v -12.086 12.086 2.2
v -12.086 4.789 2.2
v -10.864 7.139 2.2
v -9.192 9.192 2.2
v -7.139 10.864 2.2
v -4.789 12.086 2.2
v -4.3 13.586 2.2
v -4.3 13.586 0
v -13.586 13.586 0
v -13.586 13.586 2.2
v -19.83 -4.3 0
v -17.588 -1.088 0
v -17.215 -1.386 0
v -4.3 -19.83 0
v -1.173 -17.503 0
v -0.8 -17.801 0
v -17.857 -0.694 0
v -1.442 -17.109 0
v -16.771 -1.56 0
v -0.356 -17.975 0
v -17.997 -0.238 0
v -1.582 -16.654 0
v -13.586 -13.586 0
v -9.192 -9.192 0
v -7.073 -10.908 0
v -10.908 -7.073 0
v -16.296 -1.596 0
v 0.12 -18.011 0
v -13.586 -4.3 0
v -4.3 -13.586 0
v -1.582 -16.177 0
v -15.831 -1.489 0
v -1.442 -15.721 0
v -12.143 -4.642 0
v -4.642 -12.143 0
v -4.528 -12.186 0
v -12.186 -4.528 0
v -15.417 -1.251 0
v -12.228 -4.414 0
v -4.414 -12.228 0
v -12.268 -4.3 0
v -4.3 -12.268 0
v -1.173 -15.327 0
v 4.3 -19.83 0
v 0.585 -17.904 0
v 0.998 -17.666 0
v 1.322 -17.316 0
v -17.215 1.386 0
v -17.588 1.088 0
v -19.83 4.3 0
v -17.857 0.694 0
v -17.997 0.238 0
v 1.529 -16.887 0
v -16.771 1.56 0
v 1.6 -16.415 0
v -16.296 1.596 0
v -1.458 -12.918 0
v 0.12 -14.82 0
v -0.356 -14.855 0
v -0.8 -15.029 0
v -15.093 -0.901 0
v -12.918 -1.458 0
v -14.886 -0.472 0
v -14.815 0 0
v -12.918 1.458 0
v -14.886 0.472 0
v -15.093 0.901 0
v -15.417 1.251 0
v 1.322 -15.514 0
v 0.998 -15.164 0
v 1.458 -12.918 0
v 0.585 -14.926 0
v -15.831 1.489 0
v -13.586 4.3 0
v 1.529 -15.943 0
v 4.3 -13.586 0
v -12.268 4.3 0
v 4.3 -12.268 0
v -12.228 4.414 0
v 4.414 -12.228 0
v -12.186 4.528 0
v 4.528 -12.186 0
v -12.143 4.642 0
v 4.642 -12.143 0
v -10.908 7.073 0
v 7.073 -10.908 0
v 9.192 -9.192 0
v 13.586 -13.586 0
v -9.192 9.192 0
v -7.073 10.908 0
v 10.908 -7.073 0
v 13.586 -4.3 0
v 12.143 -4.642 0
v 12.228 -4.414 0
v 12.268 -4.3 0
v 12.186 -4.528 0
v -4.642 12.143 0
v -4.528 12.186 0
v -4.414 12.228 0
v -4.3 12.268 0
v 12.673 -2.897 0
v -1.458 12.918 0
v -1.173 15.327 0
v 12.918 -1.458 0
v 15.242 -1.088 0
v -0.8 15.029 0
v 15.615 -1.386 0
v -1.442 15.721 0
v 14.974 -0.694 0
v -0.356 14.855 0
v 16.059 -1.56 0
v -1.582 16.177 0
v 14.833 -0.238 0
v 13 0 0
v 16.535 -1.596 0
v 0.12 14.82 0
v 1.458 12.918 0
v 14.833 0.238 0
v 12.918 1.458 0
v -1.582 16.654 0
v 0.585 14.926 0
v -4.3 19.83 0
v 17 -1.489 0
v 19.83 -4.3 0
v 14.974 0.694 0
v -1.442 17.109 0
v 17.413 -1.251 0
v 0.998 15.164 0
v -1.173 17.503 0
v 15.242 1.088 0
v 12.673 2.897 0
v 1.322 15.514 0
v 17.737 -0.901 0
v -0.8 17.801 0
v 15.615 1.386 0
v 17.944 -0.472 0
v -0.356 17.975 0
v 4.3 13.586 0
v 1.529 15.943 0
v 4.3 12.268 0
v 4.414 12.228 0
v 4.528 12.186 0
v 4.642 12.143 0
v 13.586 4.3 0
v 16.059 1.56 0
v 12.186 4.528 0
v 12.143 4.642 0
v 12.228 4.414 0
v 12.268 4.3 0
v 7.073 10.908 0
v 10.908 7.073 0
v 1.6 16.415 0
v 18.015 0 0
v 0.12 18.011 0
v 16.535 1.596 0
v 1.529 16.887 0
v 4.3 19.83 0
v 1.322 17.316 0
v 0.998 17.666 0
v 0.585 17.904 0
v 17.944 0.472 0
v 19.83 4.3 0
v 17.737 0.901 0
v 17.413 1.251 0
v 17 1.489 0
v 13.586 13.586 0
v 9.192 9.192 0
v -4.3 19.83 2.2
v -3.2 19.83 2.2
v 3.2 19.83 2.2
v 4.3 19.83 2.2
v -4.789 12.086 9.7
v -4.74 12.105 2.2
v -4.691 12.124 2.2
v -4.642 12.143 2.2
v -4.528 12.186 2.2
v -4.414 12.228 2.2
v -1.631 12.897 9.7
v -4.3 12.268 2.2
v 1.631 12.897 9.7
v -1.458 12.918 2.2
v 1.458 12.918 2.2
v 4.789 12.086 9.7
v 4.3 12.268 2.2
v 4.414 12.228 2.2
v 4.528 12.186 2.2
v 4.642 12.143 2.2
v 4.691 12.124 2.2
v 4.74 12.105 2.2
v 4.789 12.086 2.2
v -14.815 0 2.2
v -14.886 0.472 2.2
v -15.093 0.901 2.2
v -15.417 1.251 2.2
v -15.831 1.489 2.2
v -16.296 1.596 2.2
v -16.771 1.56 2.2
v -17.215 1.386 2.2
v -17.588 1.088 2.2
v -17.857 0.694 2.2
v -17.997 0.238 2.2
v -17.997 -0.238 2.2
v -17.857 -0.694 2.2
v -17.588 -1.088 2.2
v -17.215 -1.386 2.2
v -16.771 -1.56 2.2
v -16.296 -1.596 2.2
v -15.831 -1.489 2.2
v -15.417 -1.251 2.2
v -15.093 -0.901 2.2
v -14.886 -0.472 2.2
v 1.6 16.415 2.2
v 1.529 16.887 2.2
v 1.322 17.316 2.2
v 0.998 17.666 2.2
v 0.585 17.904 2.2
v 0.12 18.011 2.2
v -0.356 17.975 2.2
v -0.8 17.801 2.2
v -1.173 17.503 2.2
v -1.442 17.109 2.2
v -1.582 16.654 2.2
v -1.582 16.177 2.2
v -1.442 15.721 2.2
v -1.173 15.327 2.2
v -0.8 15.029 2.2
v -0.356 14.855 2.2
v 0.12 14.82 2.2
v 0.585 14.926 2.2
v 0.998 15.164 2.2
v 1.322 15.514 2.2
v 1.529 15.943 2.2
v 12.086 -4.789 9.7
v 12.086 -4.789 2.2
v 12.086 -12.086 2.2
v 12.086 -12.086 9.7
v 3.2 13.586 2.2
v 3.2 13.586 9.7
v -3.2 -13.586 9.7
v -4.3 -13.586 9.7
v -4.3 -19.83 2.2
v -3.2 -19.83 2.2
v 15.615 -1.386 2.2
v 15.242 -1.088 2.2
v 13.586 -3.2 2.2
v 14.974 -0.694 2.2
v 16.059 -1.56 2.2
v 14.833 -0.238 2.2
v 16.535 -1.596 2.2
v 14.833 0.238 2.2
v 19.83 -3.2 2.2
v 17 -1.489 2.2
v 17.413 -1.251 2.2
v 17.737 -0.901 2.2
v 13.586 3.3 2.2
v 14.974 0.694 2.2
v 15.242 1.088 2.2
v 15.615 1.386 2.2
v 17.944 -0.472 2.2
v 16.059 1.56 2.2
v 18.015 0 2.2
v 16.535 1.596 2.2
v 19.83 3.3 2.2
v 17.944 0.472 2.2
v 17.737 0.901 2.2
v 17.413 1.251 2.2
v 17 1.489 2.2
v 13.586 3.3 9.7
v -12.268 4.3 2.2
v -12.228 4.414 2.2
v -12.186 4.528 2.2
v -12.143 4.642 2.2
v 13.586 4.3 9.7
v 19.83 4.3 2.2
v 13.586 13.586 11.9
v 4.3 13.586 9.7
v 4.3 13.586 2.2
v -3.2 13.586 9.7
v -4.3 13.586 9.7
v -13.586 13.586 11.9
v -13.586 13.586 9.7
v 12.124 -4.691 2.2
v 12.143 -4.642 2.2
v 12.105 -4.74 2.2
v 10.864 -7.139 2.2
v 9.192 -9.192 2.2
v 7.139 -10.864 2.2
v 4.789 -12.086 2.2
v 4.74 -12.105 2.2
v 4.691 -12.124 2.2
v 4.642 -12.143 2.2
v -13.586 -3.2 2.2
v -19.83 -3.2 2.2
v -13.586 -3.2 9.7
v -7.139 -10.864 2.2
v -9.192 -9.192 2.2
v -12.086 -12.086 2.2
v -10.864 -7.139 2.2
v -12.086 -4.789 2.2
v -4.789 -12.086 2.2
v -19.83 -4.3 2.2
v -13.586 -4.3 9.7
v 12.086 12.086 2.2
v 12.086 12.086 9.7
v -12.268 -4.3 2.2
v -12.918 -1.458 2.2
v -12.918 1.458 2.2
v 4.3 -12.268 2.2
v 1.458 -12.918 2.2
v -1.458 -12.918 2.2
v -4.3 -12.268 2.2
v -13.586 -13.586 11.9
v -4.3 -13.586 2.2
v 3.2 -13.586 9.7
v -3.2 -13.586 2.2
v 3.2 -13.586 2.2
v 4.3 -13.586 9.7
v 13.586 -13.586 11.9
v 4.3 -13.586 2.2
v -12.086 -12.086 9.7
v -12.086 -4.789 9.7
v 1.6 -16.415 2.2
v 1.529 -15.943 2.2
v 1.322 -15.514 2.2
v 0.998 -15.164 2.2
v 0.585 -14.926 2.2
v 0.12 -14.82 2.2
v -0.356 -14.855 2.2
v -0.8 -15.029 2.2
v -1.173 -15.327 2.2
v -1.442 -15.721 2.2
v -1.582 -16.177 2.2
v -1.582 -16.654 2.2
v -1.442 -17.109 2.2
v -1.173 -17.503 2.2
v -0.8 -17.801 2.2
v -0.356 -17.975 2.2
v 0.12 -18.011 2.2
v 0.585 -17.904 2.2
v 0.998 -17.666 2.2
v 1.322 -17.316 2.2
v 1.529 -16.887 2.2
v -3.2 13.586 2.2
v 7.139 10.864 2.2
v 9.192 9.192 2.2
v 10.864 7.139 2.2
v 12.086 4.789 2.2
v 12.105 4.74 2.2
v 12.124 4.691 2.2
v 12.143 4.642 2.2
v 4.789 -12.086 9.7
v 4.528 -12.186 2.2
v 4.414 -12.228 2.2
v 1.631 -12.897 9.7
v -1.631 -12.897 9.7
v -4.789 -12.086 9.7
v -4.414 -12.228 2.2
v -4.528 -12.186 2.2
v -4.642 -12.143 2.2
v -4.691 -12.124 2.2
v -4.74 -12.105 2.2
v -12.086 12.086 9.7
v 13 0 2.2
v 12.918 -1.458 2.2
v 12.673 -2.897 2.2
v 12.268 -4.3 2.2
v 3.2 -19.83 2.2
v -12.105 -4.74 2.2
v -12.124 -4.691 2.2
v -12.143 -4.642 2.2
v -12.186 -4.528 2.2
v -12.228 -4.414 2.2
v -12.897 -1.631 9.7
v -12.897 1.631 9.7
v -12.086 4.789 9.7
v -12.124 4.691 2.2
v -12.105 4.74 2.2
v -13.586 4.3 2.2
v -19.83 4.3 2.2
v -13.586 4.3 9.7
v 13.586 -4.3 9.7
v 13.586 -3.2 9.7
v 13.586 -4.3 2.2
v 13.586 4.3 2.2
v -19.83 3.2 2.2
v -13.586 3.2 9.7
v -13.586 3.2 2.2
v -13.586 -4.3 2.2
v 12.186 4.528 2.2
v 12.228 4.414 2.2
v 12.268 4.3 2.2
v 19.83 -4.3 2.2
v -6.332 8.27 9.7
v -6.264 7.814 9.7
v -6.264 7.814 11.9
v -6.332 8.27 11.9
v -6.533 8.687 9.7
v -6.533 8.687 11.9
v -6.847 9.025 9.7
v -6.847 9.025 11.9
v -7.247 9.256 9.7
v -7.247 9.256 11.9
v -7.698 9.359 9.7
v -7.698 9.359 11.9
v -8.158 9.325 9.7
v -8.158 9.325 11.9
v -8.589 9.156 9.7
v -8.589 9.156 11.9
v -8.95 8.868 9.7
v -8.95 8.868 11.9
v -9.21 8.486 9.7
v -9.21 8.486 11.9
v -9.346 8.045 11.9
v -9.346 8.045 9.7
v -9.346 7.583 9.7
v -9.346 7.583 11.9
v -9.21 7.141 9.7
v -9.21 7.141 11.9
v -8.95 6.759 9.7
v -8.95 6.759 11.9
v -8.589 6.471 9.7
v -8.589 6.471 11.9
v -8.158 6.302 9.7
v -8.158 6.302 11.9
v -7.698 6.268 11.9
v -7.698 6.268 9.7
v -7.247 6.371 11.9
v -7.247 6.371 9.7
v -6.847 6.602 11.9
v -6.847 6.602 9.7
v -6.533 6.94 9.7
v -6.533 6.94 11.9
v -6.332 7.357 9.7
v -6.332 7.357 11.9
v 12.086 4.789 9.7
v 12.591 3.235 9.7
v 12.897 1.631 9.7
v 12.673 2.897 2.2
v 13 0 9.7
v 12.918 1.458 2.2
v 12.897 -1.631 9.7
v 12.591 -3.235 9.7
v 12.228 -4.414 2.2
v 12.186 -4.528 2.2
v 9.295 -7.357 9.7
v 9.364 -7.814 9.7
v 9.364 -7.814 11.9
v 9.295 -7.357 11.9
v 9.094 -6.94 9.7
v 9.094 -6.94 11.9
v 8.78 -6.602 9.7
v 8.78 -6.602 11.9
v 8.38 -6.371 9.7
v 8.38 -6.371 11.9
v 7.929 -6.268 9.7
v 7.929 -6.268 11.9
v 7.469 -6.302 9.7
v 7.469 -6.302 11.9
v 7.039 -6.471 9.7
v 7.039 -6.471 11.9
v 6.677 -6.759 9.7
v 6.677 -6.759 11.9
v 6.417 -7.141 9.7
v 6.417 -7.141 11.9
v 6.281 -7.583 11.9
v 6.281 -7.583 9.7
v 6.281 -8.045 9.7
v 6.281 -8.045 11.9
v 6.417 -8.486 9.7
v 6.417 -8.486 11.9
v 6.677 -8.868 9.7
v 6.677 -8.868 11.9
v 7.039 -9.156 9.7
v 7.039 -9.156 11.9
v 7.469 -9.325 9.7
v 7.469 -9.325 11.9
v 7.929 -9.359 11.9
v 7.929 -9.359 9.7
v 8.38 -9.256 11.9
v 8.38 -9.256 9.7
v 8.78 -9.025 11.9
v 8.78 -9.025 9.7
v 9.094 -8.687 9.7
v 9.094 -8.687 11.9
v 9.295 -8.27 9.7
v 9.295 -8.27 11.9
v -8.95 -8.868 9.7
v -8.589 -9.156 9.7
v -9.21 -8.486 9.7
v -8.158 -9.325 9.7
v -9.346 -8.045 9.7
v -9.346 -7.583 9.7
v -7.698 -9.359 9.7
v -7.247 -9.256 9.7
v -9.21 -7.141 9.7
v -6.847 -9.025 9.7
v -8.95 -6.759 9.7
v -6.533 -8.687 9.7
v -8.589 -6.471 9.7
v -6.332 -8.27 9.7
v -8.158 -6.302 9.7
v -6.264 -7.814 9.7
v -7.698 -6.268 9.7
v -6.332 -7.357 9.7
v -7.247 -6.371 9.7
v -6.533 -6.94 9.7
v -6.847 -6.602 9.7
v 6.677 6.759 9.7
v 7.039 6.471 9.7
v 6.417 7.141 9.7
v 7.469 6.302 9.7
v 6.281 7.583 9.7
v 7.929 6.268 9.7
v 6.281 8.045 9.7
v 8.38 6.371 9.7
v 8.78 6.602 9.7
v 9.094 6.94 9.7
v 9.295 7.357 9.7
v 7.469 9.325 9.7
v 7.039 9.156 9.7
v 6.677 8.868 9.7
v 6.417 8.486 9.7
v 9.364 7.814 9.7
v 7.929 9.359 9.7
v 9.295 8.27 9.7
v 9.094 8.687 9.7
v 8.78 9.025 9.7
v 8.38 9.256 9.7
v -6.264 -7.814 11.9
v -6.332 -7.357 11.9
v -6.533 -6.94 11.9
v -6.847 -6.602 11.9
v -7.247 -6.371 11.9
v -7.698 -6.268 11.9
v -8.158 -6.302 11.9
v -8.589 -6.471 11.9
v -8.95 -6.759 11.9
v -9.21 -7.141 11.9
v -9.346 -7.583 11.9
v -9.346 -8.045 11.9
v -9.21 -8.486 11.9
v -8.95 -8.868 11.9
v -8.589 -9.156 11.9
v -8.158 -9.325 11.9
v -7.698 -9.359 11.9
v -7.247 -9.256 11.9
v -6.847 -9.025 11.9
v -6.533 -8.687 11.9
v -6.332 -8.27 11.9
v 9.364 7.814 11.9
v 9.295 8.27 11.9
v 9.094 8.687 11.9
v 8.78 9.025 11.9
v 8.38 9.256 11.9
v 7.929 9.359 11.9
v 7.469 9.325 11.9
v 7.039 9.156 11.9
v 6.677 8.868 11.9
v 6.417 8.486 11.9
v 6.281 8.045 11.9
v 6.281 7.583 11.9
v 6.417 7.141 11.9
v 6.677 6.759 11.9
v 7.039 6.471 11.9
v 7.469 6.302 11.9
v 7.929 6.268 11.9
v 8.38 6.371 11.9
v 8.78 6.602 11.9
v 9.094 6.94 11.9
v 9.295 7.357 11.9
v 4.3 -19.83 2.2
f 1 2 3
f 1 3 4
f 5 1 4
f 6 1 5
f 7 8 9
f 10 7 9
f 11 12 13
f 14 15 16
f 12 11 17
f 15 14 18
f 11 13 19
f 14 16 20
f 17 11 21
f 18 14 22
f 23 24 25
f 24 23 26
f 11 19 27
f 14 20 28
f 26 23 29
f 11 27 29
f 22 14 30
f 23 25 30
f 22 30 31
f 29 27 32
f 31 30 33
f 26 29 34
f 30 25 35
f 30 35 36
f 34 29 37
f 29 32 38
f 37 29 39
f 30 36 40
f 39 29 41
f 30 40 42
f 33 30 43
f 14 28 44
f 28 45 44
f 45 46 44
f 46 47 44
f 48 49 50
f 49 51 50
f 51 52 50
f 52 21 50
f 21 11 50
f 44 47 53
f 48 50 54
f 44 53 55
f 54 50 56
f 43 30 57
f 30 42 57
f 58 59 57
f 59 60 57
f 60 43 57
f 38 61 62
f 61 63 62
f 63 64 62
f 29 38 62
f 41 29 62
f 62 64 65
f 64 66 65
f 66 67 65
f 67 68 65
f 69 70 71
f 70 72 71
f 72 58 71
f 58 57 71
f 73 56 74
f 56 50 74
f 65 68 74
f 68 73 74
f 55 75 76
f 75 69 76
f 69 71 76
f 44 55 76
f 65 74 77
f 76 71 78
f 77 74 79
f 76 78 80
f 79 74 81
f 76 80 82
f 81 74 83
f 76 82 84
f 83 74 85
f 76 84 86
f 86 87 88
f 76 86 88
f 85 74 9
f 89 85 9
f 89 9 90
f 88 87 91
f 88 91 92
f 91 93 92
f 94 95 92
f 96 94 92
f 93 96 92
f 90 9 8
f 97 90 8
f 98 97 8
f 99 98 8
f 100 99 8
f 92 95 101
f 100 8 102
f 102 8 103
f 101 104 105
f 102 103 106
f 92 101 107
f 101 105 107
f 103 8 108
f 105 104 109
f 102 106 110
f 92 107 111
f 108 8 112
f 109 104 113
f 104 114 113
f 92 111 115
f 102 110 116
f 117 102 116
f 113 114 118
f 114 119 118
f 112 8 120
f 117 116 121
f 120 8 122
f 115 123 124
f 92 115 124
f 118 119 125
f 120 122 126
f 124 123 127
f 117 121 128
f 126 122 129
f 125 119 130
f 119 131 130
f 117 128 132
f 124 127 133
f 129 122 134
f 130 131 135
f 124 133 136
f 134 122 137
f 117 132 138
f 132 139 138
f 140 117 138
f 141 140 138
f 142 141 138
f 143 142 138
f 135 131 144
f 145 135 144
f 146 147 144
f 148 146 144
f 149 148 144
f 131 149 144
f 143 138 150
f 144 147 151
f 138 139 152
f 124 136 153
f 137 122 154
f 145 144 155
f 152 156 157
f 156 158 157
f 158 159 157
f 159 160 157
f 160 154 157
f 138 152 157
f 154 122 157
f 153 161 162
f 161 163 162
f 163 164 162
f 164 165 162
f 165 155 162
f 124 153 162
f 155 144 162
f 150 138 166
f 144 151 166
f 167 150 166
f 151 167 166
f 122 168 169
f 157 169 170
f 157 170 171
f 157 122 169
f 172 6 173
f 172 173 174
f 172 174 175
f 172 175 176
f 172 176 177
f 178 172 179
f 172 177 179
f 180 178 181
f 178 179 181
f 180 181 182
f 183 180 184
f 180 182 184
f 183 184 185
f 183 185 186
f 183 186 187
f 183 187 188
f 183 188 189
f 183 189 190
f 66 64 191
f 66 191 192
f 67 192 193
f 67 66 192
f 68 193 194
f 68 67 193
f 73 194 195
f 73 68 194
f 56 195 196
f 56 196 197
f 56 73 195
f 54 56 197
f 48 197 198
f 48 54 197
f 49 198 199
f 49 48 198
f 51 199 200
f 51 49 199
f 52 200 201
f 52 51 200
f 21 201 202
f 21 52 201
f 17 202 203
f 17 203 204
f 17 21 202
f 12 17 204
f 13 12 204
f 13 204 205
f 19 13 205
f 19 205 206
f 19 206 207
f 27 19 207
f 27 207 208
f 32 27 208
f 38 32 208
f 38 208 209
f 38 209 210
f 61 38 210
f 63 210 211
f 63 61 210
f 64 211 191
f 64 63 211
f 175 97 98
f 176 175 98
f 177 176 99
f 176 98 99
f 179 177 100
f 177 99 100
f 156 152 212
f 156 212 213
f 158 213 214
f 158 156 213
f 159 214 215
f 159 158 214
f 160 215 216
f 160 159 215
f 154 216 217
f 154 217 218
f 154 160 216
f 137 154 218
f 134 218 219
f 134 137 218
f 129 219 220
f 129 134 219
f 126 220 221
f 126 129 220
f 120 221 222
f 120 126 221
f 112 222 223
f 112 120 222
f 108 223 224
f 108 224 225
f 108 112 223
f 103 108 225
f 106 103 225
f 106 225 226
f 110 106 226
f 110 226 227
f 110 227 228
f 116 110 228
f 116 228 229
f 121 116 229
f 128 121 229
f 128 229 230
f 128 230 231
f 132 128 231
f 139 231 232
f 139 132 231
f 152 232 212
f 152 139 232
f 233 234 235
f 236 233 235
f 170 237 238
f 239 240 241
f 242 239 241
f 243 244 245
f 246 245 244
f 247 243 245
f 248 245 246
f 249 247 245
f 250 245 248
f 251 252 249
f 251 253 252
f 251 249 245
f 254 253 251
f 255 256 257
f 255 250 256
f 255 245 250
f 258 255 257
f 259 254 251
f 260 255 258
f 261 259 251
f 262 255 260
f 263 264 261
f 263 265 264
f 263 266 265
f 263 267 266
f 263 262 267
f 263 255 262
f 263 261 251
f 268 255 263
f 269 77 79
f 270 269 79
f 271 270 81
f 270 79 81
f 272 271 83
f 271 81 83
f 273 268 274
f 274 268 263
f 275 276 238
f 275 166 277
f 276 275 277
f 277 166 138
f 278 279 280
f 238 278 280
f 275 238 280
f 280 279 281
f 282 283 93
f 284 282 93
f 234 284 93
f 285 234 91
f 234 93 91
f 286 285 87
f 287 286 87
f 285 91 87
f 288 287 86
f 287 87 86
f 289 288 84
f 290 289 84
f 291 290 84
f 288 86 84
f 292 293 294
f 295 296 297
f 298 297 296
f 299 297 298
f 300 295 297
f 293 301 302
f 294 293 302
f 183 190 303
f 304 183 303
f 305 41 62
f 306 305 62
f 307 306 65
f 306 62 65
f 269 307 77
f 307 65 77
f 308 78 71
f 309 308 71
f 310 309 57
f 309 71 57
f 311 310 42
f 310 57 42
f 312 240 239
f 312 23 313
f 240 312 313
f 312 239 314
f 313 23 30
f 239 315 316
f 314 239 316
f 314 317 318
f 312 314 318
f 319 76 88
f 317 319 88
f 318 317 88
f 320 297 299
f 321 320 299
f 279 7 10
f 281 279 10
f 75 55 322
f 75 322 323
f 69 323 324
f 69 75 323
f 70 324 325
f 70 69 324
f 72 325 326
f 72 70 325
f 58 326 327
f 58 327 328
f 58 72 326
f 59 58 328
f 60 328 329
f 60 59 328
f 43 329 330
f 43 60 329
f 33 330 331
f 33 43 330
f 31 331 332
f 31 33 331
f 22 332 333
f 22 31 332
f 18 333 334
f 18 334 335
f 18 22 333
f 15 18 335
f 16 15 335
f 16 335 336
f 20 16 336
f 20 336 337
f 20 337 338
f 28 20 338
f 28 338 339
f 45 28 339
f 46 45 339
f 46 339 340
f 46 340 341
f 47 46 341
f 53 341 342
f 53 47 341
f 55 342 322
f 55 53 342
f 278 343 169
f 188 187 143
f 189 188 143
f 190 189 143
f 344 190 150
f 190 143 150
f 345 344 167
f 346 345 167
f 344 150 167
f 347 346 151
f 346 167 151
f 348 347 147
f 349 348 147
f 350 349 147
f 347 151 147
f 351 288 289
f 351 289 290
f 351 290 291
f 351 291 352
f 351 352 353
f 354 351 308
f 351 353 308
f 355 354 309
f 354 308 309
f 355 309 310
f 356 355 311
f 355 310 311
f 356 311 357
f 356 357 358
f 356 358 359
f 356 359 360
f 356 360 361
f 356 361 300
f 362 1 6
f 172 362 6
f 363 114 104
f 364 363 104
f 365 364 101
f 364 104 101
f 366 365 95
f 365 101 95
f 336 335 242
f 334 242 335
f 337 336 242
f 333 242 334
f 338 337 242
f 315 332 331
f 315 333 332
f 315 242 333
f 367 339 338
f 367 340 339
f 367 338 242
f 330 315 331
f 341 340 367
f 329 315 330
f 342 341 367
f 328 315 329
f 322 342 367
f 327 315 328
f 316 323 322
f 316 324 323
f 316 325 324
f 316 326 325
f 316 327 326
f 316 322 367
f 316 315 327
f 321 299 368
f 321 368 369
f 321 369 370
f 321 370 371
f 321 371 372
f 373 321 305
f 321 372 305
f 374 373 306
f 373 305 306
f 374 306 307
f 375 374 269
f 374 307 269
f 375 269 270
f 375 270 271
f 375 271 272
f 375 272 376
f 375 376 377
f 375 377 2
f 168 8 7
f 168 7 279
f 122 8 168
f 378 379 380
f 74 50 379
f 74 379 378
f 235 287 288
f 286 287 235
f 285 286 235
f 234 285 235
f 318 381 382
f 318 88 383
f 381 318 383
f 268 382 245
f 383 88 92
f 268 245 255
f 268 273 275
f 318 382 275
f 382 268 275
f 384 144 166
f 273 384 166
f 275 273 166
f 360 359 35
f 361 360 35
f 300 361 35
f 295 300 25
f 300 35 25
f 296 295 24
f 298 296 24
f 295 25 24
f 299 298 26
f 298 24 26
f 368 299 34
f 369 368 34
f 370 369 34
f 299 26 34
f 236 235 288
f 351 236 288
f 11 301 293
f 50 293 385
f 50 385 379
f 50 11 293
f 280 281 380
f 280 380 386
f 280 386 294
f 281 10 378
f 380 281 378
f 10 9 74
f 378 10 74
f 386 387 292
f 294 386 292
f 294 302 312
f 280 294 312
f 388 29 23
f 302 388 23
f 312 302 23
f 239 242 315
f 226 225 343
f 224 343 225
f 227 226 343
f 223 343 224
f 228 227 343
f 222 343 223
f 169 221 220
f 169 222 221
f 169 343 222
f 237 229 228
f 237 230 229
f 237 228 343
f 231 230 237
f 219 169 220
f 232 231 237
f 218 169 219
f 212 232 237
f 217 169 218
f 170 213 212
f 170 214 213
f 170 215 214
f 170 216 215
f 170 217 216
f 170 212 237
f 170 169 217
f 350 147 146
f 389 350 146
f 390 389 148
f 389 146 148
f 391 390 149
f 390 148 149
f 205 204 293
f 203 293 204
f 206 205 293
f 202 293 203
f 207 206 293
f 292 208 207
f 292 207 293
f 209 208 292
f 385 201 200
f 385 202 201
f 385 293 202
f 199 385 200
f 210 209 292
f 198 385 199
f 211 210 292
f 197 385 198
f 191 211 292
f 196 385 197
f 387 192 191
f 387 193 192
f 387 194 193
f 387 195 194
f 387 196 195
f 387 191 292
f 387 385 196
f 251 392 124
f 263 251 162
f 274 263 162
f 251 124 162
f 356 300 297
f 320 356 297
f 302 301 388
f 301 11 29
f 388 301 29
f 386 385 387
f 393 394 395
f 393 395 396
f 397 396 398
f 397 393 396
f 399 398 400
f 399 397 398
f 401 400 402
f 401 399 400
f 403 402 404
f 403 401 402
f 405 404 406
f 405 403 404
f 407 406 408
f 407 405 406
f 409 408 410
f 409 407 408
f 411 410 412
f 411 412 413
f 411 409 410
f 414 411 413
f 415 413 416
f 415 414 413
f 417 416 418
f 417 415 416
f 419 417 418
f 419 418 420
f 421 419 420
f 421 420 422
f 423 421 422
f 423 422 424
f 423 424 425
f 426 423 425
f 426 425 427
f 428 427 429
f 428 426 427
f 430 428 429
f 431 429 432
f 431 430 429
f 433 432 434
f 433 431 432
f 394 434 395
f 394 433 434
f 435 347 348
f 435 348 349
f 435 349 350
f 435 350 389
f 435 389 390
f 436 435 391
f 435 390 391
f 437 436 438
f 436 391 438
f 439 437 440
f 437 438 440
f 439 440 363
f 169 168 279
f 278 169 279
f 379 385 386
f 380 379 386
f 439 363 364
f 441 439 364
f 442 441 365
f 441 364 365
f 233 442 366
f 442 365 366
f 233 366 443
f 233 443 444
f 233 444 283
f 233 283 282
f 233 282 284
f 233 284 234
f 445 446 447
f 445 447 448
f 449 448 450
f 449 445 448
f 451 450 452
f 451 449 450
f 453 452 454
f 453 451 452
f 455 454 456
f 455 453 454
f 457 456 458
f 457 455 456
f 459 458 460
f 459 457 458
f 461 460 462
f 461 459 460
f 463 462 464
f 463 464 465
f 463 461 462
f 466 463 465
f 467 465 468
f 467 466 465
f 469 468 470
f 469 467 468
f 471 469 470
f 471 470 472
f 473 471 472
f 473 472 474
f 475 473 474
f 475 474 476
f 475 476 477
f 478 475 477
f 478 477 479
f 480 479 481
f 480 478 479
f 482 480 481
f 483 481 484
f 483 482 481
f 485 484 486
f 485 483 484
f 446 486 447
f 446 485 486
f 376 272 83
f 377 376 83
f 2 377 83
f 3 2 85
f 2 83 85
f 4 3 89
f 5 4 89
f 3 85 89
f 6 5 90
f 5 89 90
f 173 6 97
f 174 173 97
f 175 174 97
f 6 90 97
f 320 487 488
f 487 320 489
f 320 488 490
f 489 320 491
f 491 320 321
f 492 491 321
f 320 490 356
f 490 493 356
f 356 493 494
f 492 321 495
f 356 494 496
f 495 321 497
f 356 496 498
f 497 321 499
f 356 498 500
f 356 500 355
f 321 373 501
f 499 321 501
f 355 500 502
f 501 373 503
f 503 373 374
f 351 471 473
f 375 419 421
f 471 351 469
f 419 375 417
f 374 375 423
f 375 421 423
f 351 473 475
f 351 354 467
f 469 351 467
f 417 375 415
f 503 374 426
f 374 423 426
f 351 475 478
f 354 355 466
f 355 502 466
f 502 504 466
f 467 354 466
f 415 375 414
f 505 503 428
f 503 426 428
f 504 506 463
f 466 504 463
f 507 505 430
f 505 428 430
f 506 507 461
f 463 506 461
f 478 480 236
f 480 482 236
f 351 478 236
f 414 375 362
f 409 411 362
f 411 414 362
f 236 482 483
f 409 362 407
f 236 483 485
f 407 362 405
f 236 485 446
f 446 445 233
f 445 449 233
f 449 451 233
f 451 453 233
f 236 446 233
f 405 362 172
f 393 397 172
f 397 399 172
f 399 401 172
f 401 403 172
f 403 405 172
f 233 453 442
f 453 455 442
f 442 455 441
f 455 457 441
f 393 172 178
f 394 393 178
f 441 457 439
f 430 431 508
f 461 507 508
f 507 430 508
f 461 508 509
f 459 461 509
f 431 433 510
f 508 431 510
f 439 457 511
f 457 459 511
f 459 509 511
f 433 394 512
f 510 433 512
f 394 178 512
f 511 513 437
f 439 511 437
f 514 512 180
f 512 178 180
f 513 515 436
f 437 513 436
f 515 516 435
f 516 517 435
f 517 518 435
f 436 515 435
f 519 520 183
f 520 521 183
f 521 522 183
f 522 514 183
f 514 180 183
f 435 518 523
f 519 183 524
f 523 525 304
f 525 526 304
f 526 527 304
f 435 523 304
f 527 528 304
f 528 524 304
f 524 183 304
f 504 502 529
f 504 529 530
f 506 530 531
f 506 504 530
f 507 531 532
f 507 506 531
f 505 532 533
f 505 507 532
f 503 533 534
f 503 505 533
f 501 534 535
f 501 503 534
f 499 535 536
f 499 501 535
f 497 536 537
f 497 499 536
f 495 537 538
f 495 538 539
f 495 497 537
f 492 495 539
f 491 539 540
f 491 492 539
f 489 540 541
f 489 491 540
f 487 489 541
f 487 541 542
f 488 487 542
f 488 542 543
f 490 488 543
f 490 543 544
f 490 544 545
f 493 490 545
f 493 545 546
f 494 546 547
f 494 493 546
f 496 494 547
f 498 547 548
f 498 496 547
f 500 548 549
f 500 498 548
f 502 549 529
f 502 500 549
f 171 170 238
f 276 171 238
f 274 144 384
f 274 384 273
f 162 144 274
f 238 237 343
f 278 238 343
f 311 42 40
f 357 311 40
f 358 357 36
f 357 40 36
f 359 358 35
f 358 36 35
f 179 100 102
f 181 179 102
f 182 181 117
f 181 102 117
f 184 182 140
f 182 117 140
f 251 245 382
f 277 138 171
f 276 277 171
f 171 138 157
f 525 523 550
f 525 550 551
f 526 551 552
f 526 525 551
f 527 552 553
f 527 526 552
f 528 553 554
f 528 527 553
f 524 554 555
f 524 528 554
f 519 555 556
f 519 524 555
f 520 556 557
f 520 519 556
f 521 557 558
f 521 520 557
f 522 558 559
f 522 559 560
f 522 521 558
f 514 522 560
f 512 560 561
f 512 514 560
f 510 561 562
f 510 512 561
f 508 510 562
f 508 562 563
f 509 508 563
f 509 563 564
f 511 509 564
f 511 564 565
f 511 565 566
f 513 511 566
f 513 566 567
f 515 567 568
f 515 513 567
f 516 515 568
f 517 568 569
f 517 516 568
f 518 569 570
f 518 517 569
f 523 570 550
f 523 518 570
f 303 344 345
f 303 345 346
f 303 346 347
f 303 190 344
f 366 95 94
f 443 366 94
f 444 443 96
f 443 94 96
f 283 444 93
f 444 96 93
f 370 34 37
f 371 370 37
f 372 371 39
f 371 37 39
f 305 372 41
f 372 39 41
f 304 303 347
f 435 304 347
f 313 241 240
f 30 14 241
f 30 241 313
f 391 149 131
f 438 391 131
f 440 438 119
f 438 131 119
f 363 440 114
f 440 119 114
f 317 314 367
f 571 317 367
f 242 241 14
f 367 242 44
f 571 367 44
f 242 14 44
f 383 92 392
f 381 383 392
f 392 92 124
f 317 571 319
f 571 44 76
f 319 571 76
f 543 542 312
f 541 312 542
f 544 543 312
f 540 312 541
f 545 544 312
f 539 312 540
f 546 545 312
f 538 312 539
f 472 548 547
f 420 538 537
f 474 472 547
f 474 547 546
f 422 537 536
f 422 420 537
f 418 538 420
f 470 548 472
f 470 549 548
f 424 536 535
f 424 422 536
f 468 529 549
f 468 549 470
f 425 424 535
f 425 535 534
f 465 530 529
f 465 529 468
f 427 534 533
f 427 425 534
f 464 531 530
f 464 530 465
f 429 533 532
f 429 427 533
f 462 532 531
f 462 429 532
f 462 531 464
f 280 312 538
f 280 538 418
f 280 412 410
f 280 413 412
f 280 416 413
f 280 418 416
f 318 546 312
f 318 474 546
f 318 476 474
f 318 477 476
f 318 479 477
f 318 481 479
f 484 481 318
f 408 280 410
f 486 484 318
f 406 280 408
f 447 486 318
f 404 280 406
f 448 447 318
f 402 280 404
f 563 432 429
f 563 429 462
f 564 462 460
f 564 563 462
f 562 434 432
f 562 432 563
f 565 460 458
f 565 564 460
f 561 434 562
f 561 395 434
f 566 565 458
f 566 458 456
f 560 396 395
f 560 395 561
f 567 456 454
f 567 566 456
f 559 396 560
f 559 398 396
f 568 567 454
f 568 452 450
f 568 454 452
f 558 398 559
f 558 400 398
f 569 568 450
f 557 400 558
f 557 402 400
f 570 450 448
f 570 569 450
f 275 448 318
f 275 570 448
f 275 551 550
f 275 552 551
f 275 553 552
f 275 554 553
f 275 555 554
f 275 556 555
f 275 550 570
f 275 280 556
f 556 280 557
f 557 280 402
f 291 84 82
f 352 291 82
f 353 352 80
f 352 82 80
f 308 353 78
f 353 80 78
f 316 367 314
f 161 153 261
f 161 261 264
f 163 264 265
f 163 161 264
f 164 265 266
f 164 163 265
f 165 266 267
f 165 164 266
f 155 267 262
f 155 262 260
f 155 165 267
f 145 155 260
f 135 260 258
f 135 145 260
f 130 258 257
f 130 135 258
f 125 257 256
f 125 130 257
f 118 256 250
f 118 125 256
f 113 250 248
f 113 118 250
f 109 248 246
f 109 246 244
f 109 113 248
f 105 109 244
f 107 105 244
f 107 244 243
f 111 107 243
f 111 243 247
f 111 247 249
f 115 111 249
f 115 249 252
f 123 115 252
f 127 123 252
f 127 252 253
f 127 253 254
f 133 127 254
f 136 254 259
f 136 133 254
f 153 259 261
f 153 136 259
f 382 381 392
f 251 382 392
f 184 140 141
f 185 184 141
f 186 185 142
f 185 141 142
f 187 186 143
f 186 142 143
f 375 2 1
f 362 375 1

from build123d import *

# Parameters (mm, degrees)
F0_R      = 1.6
F1_DEPTH  = 2.2
F2_W      = 1.1
F2_H      = 6.2444173613
F2_W_2    = 6.2444173613
F2_H_2    = 1
F2_H_3    = 1.1
F3_DEPTH  = 7.5
F5_DEPTH  = 24.1311635683
F7_DEPTH  = 24.1311635683
F9_DEPTH  = 24.1311635683
F11_DEPTH = 24.1311635683
F12_R     = 1.55
F13_DEPTH = 2.2


with BuildPart() as f1:
    # F0 (on Top) → F1 (new body)
    with BuildSketch(Plane.XY):
        with BuildLine():
            ThreePointArc((-4.3, 13.585746207), (0, 14.25), (4.3, 13.585746207))
            Line((4.3, 13.585746207), (4.3, 19.8301635683))
            Line((4.3, 19.8301635683), (0, 19.8301635683))
            Line((0, 19.8301635683), (-4.3, 19.8301635683))
            Line((-4.3, 19.8301635683), (-4.3, 13.585746207))
        make_face()
        with Locations((0, 16.4150817841)):
            Circle(F0_R, mode=Mode.SUBTRACT)
        with BuildLine():
            Line((-7.4573291436, 12.1429297142), (-4.642117831, 12.1429297142))
            ThreePointArc((-4.642117831, 12.1429297142), (-4.4714979846, 12.2067893311), (-4.3, 12.2682517092))
            Line((-4.3, 12.2682517092), (-4.3, 13.585746207))
            ThreePointArc((-4.3, 13.585746207), (-5.9227634602, 12.9608399803), (-7.4573291436, 12.1429297142))
        make_face()
        with BuildLine():
            ThreePointArc((-4.3, 12.2682517092), (0, 13), (4.3, 12.2682517092))
            Line((4.3, 12.2682517092), (4.3, 13.585746207))
            ThreePointArc((4.3, 13.585746207), (0, 14.25), (-4.3, 13.585746207))
            Line((-4.3, 13.585746207), (-4.3, 12.2682517092))
        make_face()
        with BuildLine():
            ThreePointArc((4.3, 12.2682517092), (4.4714979846, 12.2067893311), (4.642117831, 12.1429297142))
            Line((4.642117831, 12.1429297142), (7.4573291436, 12.1429297142))
            ThreePointArc((7.4573291436, 12.1429297142), (5.9227634602, 12.9608399803), (4.3, 13.585746207))
            Line((4.3, 13.585746207), (4.3, 12.2682517092))
        make_face()
        with BuildLine():
            ThreePointArc((12.2682517092, 4.3), (12.8157573366, 2.1809089596), (13, 0))
            ThreePointArc((13, 0), (12.8157573366, -2.1809089596), (12.2682517092, -4.3))
            Line((12.2682517092, -4.3), (13.585746207, -4.3))
            ThreePointArc((13.585746207, -4.3), (14.0829574921, -2.1755018445), (14.25, 0))
            ThreePointArc((14.25, 0), (14.0829574921, 2.1755018445), (13.585746207, 4.3))
            Line((13.585746207, 4.3), (12.2682517092, 4.3))
        make_face()
        with BuildLine():
            Line((19.8301635683, 4.3), (13.585746207, 4.3))
            ThreePointArc((13.585746207, 4.3), (14.0829574921, 2.1755018445), (14.25, 0))
            ThreePointArc((14.25, 0), (14.0829574921, -2.1755018445), (13.585746207, -4.3))
            Line((13.585746207, -4.3), (19.8301635683, -4.3))
            Line((19.8301635683, -4.3), (19.8301635683, 0))
            Line((19.8301635683, 0), (19.8301635683, 4.3))
        make_face()
        with Locations((16.4150817841, 0)):
            Circle(F0_R, mode=Mode.SUBTRACT)
        with BuildLine():
            Line((13.585746207, -4.3), (12.2682517092, -4.3))
            ThreePointArc((12.2682517092, -4.3), (12.2067893311, -4.4714979846), (12.1429297142, -4.642117831))
            Line((12.1429297142, -4.642117831), (12.1429297142, -7.4573291436))
            ThreePointArc((12.1429297142, -7.4573291436), (12.9608399803, -5.9227634602), (13.585746207, -4.3))
        make_face()
        with BuildLine():
            Line((4.3, -13.585746207), (4.3, -12.2682517092))
            ThreePointArc((4.3, -12.2682517092), (0, -13), (-4.3, -12.2682517092))
            Line((-4.3, -12.2682517092), (-4.3, -13.585746207))
            ThreePointArc((-4.3, -13.585746207), (0, -14.25), (4.3, -13.585746207))
        make_face()
        with BuildLine():
            ThreePointArc((-4.3, -12.2682517092), (-4.4714979846, -12.2067893311), (-4.642117831, -12.1429297142))
            Line((-4.642117831, -12.1429297142), (-7.4573291436, -12.1429297142))
            ThreePointArc((-7.4573291436, -12.1429297142), (-5.9227634602, -12.9608399803), (-4.3, -13.585746207))
            Line((-4.3, -13.585746207), (-4.3, -12.2682517092))
        make_face()
        with BuildLine():
            ThreePointArc((-12.2682517092, -4.3), (-13, 0), (-12.2682517092, 4.3))
            Line((-12.2682517092, 4.3), (-13.585746207, 4.3))
            ThreePointArc((-13.585746207, 4.3), (-14.25, 0), (-13.585746207, -4.3))
            Line((-13.585746207, -4.3), (-12.2682517092, -4.3))
        make_face()
        with BuildLine():
            ThreePointArc((-13.585746207, -4.3), (-14.25, 0), (-13.585746207, 4.3))
            Line((-13.585746207, 4.3), (-19.8301635683, 4.3))
            Line((-19.8301635683, 4.3), (-19.8301635683, 0))
            Line((-19.8301635683, 0), (-19.8301635683, -4.3))
            Line((-19.8301635683, -4.3), (-13.585746207, -4.3))
        make_face()
        with Locations((-16.4150817841, 0)):
            Circle(F0_R, mode=Mode.SUBTRACT)
        with BuildLine():
            Line((4.3, -19.8301635683), (4.3, -13.585746207))
            ThreePointArc((4.3, -13.585746207), (0, -14.25), (-4.3, -13.585746207))
            Line((-4.3, -13.585746207), (-4.3, -19.8301635683))
            Line((-4.3, -19.8301635683), (0, -19.8301635683))
            Line((0, -19.8301635683), (4.3, -19.8301635683))
        make_face()
        with Locations((0, -16.4150817841)):
            Circle(F0_R, mode=Mode.SUBTRACT)
        with BuildLine():
            ThreePointArc((-12.1429297142, 7.4573291436), (-10.0762716319, 10.0762716319), (-7.4573291436, 12.1429297142))
            Line((-7.4573291436, 12.1429297142), (-12.1429297142, 12.1429297142))
            Line((-12.1429297142, 12.1429297142), (-12.1429297142, 7.4573291436))
        make_face()
        with BuildLine():
            ThreePointArc((-4.3, -13.585746207), (-5.9227634602, -12.9608399803), (-7.4573291436, -12.1429297142))
            Line((-7.4573291436, -12.1429297142), (-12.1429297142, -12.1429297142))
            Line((-12.1429297142, -12.1429297142), (-12.1429297142, -7.4573291436))
            ThreePointArc((-12.1429297142, -7.4573291436), (-12.9608399803, -5.9227634602), (-13.585746207, -4.3))
            Line((-13.585746207, -4.3), (-13.585746207, -13.585746207))
            Line((-13.585746207, -13.585746207), (-4.3, -13.585746207))
        make_face()
        with BuildLine():
            Line((-12.1429297142, -12.1429297142), (-7.4573291436, -12.1429297142))
            ThreePointArc((-7.4573291436, -12.1429297142), (-10.0762716319, -10.0762716319), (-12.1429297142, -7.4573291436))
            Line((-12.1429297142, -7.4573291436), (-12.1429297142, -12.1429297142))
        make_face()
        with BuildLine():
            Line((-12.1429297142, -7.4573291436), (-12.1429297142, -4.642117831))
            ThreePointArc((-12.1429297142, -4.642117831), (-12.2067893311, -4.4714979846), (-12.2682517092, -4.3))
            Line((-12.2682517092, -4.3), (-13.585746207, -4.3))
            ThreePointArc((-13.585746207, -4.3), (-12.9608399803, -5.9227634602), (-12.1429297142, -7.4573291436))
        make_face()
        with BuildLine():
            Line((-12.1429297142, 12.1429297142), (-7.4573291436, 12.1429297142))
            ThreePointArc((-7.4573291436, 12.1429297142), (-5.9227634602, 12.9608399803), (-4.3, 13.585746207))
            Line((-4.3, 13.585746207), (-13.585746207, 13.585746207))
            Line((-13.585746207, 13.585746207), (-13.585746207, 4.3))
            ThreePointArc((-13.585746207, 4.3), (-12.9608399803, 5.9227634602), (-12.1429297142, 7.4573291436))
            Line((-12.1429297142, 7.4573291436), (-12.1429297142, 12.1429297142))
        make_face()
        with BuildLine():
            ThreePointArc((12.1429297142, 7.4573291436), (12.9608399803, 5.9227634602), (13.585746207, 4.3))
            Line((13.585746207, 4.3), (13.585746207, 13.585746207))
            Line((13.585746207, 13.585746207), (4.3, 13.585746207))
            ThreePointArc((4.3, 13.585746207), (5.9227634602, 12.9608399803), (7.4573291436, 12.1429297142))
            Line((7.4573291436, 12.1429297142), (12.1429297142, 12.1429297142))
            Line((12.1429297142, 12.1429297142), (12.1429297142, 7.4573291436))
        make_face()
        with BuildLine():
            ThreePointArc((7.4573291436, 12.1429297142), (10.0762716319, 10.0762716319), (12.1429297142, 7.4573291436))
            Line((12.1429297142, 7.4573291436), (12.1429297142, 12.1429297142))
            Line((12.1429297142, 12.1429297142), (7.4573291436, 12.1429297142))
        make_face()
        with BuildLine():
            ThreePointArc((4.642117831, 12.1429297142), (9.1923881554, 9.1923881554), (12.1429297142, 4.642117831))
            Line((12.1429297142, 4.642117831), (12.1429297142, 7.4573291436))
            ThreePointArc((12.1429297142, 7.4573291436), (10.0762716319, 10.0762716319), (7.4573291436, 12.1429297142))
            Line((7.4573291436, 12.1429297142), (4.642117831, 12.1429297142))
        make_face()
        with BuildLine():
            ThreePointArc((12.1429297142, 4.642117831), (12.2067893311, 4.4714979846), (12.2682517092, 4.3))
            Line((12.2682517092, 4.3), (13.585746207, 4.3))
            ThreePointArc((13.585746207, 4.3), (12.9608399803, 5.9227634602), (12.1429297142, 7.4573291436))
            Line((12.1429297142, 7.4573291436), (12.1429297142, 4.642117831))
        make_face()
        with BuildLine():
            ThreePointArc((-12.1429297142, 4.642117831), (-9.1923881554, 9.1923881554), (-4.642117831, 12.1429297142))
            Line((-4.642117831, 12.1429297142), (-7.4573291436, 12.1429297142))
            ThreePointArc((-7.4573291436, 12.1429297142), (-10.0762716319, 10.0762716319), (-12.1429297142, 7.4573291436))
            Line((-12.1429297142, 7.4573291436), (-12.1429297142, 4.642117831))
        make_face()
        with BuildLine():
            ThreePointArc((-12.2682517092, 4.3), (-12.2067893311, 4.4714979846), (-12.1429297142, 4.642117831))
            Line((-12.1429297142, 4.642117831), (-12.1429297142, 7.4573291436))
            ThreePointArc((-12.1429297142, 7.4573291436), (-12.9608399803, 5.9227634602), (-13.585746207, 4.3))
            Line((-13.585746207, 4.3), (-12.2682517092, 4.3))
        make_face()
        with BuildLine():
            Line((-7.4573291436, -12.1429297142), (-4.642117831, -12.1429297142))
            ThreePointArc((-4.642117831, -12.1429297142), (-9.1923881554, -9.1923881554), (-12.1429297142, -4.642117831))
            Line((-12.1429297142, -4.642117831), (-12.1429297142, -7.4573291436))
            ThreePointArc((-12.1429297142, -7.4573291436), (-10.0762716319, -10.0762716319), (-7.4573291436, -12.1429297142))
        make_face()
        with BuildLine():
            Line((12.1429297142, -7.4573291436), (12.1429297142, -4.642117831))
            ThreePointArc((12.1429297142, -4.642117831), (9.1923881554, -9.1923881554), (4.642117831, -12.1429297142))
            Line((4.642117831, -12.1429297142), (7.4573291436, -12.1429297142))
            ThreePointArc((7.4573291436, -12.1429297142), (10.0762716319, -10.0762716319), (12.1429297142, -7.4573291436))
        make_face()
        with BuildLine():
            Line((12.1429297142, -12.1429297142), (12.1429297142, -7.4573291436))
            ThreePointArc((12.1429297142, -7.4573291436), (10.0762716319, -10.0762716319), (7.4573291436, -12.1429297142))
            Line((7.4573291436, -12.1429297142), (12.1429297142, -12.1429297142))
        make_face()
        with BuildLine():
            Line((13.585746207, -13.585746207), (13.585746207, -4.3))
            ThreePointArc((13.585746207, -4.3), (12.9608399803, -5.9227634602), (12.1429297142, -7.4573291436))
            Line((12.1429297142, -7.4573291436), (12.1429297142, -12.1429297142))
            Line((12.1429297142, -12.1429297142), (7.4573291436, -12.1429297142))
            ThreePointArc((7.4573291436, -12.1429297142), (5.9227634602, -12.9608399803), (4.3, -13.585746207))
            Line((4.3, -13.585746207), (13.585746207, -13.585746207))
        make_face()
        with BuildLine():
            Line((7.4573291436, -12.1429297142), (4.642117831, -12.1429297142))
            ThreePointArc((4.642117831, -12.1429297142), (4.4714979846, -12.2067893311), (4.3, -12.2682517092))
            Line((4.3, -12.2682517092), (4.3, -13.585746207))
            ThreePointArc((4.3, -13.585746207), (5.9227634602, -12.9608399803), (7.4573291436, -12.1429297142))
        make_face()
    extrude(amount=F1_DEPTH)

    # F2 (on face) → F3 (join)
    with BuildSketch(Plane.XY.offset(2.2)):
        with Locations((3.75, 16.7079548876)):
            Rectangle(F2_W, F2_H)
        Polygon((-3.2, 13.585746207), (-4.3, 13.585746207), (-13.585746207, 13.585746207), (-13.585746207, 4.3), (-13.585746207, 3.2), (-13.585746207, -3.2), (-13.585746207, -4.3), (-13.585746207, -13.585746207), (-4.3, -13.585746207), (-3.2, -13.585746207), (3.2, -13.585746207), (4.3, -13.585746207), (13.585746207, -13.585746207), (13.585746207, -4.3), (13.585746207, -3.2), (13.585746207, 3.3), (13.585746207, 4.3), (13.585746207, 13.585746207), (4.3, 13.585746207), (3.2, 13.585746207), align=None)
        with BuildLine():
            Line((-12.085746207, 4.7890227209), (-12.085746207, 12.085746207))
            Line((-12.085746207, 12.085746207), (-4.7890227209, 12.085746207))
            ThreePointArc((-4.7890227209, 12.085746207), (0, 13), (4.7890227209, 12.085746207))
            Line((4.7890227209, 12.085746207), (12.085746207, 12.085746207))
            Line((12.085746207, 12.085746207), (12.085746207, 4.7890227209))
            ThreePointArc((12.085746207, 4.7890227209), (12.7693911501, 2.4377550441), (13, 0))
            ThreePointArc((13, 0), (12.7693911501, -2.437755044), (12.085746207, -4.7890227209))
            Line((12.085746207, -4.7890227209), (12.085746207, -12.085746207))
            Line((12.085746207, -12.085746207), (4.7890227209, -12.085746207))
            ThreePointArc((4.7890227209, -12.085746207), (0, -13), (-4.7890227209, -12.085746207))
            Line((-4.7890227209, -12.085746207), (-12.085746207, -12.085746207))
            Line((-12.085746207, -12.085746207), (-12.085746207, -4.7890227209))
            ThreePointArc((-12.085746207, -4.7890227209), (-13, 0), (-12.085746207, 4.7890227209))
        make_face(mode=Mode.SUBTRACT)
        with Locations((-3.75, 16.7079548876)):
            Rectangle(F2_W, F2_H)
        with Locations((16.7079548876, 3.8)):
            Rectangle(F2_W_2, F2_H_2)
        with Locations((16.7079548876, -3.75)):
            Rectangle(F2_W_2, F2_H_3)
        with Locations((-16.7079548876, 3.75)):
            Rectangle(F2_W_2, F2_H_3)
        with Locations((-16.7079548876, -3.75)):
            Rectangle(F2_W_2, F2_H_3)
        with Locations((-3.75, -16.7079548876)):
            Rectangle(F2_W, F2_H)
        with Locations((3.75, -16.7079548876)):
            Rectangle(F2_W, F2_H)
    extrude(amount=F3_DEPTH)

    # F4 (on face) → F5 (cut, through all)
    with BuildSketch(Plane.XZ.offset(4.3)):
        Polygon((-19.8301635683, 9.7), (-19.8301635683, 2.2), (-13.585746207, 9.7), align=None)
    extrude(amount=-F5_DEPTH, mode=Mode.SUBTRACT)

    # F6 (on face) → F7 (cut, through all)
    with BuildSketch(Plane.XZ.offset(4.3)):
        Polygon((13.585746207, 9.7), (19.8301635683, 2.2), (19.8301635683, 9.7), align=None)
    extrude(amount=-F7_DEPTH, mode=Mode.SUBTRACT)

    # F8 (on face) → F9 (cut, through all)
    with BuildSketch(Plane(origin=(-4.3, 0, 0), x_dir=(0, -1, 0), z_dir=(-1, 0, 0))):
        Polygon((13.585746207, 9.7), (19.8301635683, 2.2), (19.8301635683, 9.7), align=None)
    extrude(amount=-F9_DEPTH, mode=Mode.SUBTRACT)

    # F10 (on face) → F11 (cut, through all)
    with BuildSketch(Plane(origin=(-4.3, 0, 0), x_dir=(0, -1, 0), z_dir=(-1, 0, 0))):
        Polygon((-19.8301635683, 9.7), (-19.8301635683, 2.2), (-13.585746207, 9.7), align=None)
    extrude(amount=-F11_DEPTH, mode=Mode.SUBTRACT)

    # F12 (on face) → F13 (join)
    with BuildSketch(Plane.XY.offset(9.7)):
        Polygon((-4.3, 13.585746207), (-13.585746207, 13.585746207), (-13.585746207, 4.3), (-13.585746207, 3.2), (-13.585746207, -3.2), (-13.585746207, -4.3), (-13.585746207, -13.585746207), (-4.3, -13.585746207), (-3.2, -13.585746207), (3.2, -13.585746207), (4.3, -13.585746207), (13.585746207, -13.585746207), (13.585746207, -4.3), (13.585746207, -3.2), (13.585746207, 3.3), (13.585746207, 4.3), (13.585746207, 13.585746207), (4.3, 13.585746207), (3.2, 13.585746207), (-3.2, 13.585746207), align=None)
        with BuildLine():
            Line((12.085746207, -4.7890227209), (12.085746207, -12.085746207))
            Line((12.085746207, -12.085746207), (4.7890227209, -12.085746207))
            ThreePointArc((4.7890227209, -12.085746207), (0, -13), (-4.7890227209, -12.085746207))
            Line((-4.7890227209, -12.085746207), (-12.085746207, -12.085746207))
            Line((-12.085746207, -12.085746207), (-12.085746207, -4.7890227209))
            ThreePointArc((-12.085746207, -4.7890227209), (-13, 0), (-12.085746207, 4.7890227209))
            Line((-12.085746207, 4.7890227209), (-12.085746207, 12.085746207))
            Line((-12.085746207, 12.085746207), (-4.7890227209, 12.085746207))
            ThreePointArc((-4.7890227209, 12.085746207), (0, 13), (4.7890227209, 12.085746207))
            Line((4.7890227209, 12.085746207), (12.085746207, 12.085746207))
            Line((12.085746207, 12.085746207), (12.085746207, 4.7890227209))
            ThreePointArc((12.085746207, 4.7890227209), (13, 0), (12.085746207, -4.7890227209))
        make_face(mode=Mode.SUBTRACT)
        with BuildLine():
            Line((4.7890227209, -12.085746207), (12.085746207, -12.085746207))
            Line((12.085746207, -12.085746207), (12.085746207, -4.7890227209))
            ThreePointArc((12.085746207, -4.7890227209), (13, 0), (12.085746207, 4.7890227209))
            Line((12.085746207, 4.7890227209), (12.085746207, 12.085746207))
            Line((12.085746207, 12.085746207), (4.7890227209, 12.085746207))
            ThreePointArc((4.7890227209, 12.085746207), (0, 13), (-4.7890227209, 12.085746207))
            Line((-4.7890227209, 12.085746207), (-12.085746207, 12.085746207))
            Line((-12.085746207, 12.085746207), (-12.085746207, 4.7890227209))
            ThreePointArc((-12.085746207, 4.7890227209), (-13, 0), (-12.085746207, -4.7890227209))
            Line((-12.085746207, -4.7890227209), (-12.085746207, -12.085746207))
            Line((-12.085746207, -12.085746207), (-4.7890227209, -12.085746207))
            ThreePointArc((-4.7890227209, -12.085746207), (0, -13), (4.7890227209, -12.085746207))
        make_face()
        with Locations((-7.8135299321, -7.8135299321)):
            Circle(F12_R, mode=Mode.SUBTRACT)
        with Locations((7.8135299321, -7.8135299321)):
            Circle(F12_R, mode=Mode.SUBTRACT)
        with Locations((-7.8135299321, 7.8135299321)):
            Circle(F12_R, mode=Mode.SUBTRACT)
        with Locations((7.8135299321, 7.8135299321)):
            Circle(F12_R, mode=Mode.SUBTRACT)
    extrude(amount=F13_DEPTH)


solid = f1.part
